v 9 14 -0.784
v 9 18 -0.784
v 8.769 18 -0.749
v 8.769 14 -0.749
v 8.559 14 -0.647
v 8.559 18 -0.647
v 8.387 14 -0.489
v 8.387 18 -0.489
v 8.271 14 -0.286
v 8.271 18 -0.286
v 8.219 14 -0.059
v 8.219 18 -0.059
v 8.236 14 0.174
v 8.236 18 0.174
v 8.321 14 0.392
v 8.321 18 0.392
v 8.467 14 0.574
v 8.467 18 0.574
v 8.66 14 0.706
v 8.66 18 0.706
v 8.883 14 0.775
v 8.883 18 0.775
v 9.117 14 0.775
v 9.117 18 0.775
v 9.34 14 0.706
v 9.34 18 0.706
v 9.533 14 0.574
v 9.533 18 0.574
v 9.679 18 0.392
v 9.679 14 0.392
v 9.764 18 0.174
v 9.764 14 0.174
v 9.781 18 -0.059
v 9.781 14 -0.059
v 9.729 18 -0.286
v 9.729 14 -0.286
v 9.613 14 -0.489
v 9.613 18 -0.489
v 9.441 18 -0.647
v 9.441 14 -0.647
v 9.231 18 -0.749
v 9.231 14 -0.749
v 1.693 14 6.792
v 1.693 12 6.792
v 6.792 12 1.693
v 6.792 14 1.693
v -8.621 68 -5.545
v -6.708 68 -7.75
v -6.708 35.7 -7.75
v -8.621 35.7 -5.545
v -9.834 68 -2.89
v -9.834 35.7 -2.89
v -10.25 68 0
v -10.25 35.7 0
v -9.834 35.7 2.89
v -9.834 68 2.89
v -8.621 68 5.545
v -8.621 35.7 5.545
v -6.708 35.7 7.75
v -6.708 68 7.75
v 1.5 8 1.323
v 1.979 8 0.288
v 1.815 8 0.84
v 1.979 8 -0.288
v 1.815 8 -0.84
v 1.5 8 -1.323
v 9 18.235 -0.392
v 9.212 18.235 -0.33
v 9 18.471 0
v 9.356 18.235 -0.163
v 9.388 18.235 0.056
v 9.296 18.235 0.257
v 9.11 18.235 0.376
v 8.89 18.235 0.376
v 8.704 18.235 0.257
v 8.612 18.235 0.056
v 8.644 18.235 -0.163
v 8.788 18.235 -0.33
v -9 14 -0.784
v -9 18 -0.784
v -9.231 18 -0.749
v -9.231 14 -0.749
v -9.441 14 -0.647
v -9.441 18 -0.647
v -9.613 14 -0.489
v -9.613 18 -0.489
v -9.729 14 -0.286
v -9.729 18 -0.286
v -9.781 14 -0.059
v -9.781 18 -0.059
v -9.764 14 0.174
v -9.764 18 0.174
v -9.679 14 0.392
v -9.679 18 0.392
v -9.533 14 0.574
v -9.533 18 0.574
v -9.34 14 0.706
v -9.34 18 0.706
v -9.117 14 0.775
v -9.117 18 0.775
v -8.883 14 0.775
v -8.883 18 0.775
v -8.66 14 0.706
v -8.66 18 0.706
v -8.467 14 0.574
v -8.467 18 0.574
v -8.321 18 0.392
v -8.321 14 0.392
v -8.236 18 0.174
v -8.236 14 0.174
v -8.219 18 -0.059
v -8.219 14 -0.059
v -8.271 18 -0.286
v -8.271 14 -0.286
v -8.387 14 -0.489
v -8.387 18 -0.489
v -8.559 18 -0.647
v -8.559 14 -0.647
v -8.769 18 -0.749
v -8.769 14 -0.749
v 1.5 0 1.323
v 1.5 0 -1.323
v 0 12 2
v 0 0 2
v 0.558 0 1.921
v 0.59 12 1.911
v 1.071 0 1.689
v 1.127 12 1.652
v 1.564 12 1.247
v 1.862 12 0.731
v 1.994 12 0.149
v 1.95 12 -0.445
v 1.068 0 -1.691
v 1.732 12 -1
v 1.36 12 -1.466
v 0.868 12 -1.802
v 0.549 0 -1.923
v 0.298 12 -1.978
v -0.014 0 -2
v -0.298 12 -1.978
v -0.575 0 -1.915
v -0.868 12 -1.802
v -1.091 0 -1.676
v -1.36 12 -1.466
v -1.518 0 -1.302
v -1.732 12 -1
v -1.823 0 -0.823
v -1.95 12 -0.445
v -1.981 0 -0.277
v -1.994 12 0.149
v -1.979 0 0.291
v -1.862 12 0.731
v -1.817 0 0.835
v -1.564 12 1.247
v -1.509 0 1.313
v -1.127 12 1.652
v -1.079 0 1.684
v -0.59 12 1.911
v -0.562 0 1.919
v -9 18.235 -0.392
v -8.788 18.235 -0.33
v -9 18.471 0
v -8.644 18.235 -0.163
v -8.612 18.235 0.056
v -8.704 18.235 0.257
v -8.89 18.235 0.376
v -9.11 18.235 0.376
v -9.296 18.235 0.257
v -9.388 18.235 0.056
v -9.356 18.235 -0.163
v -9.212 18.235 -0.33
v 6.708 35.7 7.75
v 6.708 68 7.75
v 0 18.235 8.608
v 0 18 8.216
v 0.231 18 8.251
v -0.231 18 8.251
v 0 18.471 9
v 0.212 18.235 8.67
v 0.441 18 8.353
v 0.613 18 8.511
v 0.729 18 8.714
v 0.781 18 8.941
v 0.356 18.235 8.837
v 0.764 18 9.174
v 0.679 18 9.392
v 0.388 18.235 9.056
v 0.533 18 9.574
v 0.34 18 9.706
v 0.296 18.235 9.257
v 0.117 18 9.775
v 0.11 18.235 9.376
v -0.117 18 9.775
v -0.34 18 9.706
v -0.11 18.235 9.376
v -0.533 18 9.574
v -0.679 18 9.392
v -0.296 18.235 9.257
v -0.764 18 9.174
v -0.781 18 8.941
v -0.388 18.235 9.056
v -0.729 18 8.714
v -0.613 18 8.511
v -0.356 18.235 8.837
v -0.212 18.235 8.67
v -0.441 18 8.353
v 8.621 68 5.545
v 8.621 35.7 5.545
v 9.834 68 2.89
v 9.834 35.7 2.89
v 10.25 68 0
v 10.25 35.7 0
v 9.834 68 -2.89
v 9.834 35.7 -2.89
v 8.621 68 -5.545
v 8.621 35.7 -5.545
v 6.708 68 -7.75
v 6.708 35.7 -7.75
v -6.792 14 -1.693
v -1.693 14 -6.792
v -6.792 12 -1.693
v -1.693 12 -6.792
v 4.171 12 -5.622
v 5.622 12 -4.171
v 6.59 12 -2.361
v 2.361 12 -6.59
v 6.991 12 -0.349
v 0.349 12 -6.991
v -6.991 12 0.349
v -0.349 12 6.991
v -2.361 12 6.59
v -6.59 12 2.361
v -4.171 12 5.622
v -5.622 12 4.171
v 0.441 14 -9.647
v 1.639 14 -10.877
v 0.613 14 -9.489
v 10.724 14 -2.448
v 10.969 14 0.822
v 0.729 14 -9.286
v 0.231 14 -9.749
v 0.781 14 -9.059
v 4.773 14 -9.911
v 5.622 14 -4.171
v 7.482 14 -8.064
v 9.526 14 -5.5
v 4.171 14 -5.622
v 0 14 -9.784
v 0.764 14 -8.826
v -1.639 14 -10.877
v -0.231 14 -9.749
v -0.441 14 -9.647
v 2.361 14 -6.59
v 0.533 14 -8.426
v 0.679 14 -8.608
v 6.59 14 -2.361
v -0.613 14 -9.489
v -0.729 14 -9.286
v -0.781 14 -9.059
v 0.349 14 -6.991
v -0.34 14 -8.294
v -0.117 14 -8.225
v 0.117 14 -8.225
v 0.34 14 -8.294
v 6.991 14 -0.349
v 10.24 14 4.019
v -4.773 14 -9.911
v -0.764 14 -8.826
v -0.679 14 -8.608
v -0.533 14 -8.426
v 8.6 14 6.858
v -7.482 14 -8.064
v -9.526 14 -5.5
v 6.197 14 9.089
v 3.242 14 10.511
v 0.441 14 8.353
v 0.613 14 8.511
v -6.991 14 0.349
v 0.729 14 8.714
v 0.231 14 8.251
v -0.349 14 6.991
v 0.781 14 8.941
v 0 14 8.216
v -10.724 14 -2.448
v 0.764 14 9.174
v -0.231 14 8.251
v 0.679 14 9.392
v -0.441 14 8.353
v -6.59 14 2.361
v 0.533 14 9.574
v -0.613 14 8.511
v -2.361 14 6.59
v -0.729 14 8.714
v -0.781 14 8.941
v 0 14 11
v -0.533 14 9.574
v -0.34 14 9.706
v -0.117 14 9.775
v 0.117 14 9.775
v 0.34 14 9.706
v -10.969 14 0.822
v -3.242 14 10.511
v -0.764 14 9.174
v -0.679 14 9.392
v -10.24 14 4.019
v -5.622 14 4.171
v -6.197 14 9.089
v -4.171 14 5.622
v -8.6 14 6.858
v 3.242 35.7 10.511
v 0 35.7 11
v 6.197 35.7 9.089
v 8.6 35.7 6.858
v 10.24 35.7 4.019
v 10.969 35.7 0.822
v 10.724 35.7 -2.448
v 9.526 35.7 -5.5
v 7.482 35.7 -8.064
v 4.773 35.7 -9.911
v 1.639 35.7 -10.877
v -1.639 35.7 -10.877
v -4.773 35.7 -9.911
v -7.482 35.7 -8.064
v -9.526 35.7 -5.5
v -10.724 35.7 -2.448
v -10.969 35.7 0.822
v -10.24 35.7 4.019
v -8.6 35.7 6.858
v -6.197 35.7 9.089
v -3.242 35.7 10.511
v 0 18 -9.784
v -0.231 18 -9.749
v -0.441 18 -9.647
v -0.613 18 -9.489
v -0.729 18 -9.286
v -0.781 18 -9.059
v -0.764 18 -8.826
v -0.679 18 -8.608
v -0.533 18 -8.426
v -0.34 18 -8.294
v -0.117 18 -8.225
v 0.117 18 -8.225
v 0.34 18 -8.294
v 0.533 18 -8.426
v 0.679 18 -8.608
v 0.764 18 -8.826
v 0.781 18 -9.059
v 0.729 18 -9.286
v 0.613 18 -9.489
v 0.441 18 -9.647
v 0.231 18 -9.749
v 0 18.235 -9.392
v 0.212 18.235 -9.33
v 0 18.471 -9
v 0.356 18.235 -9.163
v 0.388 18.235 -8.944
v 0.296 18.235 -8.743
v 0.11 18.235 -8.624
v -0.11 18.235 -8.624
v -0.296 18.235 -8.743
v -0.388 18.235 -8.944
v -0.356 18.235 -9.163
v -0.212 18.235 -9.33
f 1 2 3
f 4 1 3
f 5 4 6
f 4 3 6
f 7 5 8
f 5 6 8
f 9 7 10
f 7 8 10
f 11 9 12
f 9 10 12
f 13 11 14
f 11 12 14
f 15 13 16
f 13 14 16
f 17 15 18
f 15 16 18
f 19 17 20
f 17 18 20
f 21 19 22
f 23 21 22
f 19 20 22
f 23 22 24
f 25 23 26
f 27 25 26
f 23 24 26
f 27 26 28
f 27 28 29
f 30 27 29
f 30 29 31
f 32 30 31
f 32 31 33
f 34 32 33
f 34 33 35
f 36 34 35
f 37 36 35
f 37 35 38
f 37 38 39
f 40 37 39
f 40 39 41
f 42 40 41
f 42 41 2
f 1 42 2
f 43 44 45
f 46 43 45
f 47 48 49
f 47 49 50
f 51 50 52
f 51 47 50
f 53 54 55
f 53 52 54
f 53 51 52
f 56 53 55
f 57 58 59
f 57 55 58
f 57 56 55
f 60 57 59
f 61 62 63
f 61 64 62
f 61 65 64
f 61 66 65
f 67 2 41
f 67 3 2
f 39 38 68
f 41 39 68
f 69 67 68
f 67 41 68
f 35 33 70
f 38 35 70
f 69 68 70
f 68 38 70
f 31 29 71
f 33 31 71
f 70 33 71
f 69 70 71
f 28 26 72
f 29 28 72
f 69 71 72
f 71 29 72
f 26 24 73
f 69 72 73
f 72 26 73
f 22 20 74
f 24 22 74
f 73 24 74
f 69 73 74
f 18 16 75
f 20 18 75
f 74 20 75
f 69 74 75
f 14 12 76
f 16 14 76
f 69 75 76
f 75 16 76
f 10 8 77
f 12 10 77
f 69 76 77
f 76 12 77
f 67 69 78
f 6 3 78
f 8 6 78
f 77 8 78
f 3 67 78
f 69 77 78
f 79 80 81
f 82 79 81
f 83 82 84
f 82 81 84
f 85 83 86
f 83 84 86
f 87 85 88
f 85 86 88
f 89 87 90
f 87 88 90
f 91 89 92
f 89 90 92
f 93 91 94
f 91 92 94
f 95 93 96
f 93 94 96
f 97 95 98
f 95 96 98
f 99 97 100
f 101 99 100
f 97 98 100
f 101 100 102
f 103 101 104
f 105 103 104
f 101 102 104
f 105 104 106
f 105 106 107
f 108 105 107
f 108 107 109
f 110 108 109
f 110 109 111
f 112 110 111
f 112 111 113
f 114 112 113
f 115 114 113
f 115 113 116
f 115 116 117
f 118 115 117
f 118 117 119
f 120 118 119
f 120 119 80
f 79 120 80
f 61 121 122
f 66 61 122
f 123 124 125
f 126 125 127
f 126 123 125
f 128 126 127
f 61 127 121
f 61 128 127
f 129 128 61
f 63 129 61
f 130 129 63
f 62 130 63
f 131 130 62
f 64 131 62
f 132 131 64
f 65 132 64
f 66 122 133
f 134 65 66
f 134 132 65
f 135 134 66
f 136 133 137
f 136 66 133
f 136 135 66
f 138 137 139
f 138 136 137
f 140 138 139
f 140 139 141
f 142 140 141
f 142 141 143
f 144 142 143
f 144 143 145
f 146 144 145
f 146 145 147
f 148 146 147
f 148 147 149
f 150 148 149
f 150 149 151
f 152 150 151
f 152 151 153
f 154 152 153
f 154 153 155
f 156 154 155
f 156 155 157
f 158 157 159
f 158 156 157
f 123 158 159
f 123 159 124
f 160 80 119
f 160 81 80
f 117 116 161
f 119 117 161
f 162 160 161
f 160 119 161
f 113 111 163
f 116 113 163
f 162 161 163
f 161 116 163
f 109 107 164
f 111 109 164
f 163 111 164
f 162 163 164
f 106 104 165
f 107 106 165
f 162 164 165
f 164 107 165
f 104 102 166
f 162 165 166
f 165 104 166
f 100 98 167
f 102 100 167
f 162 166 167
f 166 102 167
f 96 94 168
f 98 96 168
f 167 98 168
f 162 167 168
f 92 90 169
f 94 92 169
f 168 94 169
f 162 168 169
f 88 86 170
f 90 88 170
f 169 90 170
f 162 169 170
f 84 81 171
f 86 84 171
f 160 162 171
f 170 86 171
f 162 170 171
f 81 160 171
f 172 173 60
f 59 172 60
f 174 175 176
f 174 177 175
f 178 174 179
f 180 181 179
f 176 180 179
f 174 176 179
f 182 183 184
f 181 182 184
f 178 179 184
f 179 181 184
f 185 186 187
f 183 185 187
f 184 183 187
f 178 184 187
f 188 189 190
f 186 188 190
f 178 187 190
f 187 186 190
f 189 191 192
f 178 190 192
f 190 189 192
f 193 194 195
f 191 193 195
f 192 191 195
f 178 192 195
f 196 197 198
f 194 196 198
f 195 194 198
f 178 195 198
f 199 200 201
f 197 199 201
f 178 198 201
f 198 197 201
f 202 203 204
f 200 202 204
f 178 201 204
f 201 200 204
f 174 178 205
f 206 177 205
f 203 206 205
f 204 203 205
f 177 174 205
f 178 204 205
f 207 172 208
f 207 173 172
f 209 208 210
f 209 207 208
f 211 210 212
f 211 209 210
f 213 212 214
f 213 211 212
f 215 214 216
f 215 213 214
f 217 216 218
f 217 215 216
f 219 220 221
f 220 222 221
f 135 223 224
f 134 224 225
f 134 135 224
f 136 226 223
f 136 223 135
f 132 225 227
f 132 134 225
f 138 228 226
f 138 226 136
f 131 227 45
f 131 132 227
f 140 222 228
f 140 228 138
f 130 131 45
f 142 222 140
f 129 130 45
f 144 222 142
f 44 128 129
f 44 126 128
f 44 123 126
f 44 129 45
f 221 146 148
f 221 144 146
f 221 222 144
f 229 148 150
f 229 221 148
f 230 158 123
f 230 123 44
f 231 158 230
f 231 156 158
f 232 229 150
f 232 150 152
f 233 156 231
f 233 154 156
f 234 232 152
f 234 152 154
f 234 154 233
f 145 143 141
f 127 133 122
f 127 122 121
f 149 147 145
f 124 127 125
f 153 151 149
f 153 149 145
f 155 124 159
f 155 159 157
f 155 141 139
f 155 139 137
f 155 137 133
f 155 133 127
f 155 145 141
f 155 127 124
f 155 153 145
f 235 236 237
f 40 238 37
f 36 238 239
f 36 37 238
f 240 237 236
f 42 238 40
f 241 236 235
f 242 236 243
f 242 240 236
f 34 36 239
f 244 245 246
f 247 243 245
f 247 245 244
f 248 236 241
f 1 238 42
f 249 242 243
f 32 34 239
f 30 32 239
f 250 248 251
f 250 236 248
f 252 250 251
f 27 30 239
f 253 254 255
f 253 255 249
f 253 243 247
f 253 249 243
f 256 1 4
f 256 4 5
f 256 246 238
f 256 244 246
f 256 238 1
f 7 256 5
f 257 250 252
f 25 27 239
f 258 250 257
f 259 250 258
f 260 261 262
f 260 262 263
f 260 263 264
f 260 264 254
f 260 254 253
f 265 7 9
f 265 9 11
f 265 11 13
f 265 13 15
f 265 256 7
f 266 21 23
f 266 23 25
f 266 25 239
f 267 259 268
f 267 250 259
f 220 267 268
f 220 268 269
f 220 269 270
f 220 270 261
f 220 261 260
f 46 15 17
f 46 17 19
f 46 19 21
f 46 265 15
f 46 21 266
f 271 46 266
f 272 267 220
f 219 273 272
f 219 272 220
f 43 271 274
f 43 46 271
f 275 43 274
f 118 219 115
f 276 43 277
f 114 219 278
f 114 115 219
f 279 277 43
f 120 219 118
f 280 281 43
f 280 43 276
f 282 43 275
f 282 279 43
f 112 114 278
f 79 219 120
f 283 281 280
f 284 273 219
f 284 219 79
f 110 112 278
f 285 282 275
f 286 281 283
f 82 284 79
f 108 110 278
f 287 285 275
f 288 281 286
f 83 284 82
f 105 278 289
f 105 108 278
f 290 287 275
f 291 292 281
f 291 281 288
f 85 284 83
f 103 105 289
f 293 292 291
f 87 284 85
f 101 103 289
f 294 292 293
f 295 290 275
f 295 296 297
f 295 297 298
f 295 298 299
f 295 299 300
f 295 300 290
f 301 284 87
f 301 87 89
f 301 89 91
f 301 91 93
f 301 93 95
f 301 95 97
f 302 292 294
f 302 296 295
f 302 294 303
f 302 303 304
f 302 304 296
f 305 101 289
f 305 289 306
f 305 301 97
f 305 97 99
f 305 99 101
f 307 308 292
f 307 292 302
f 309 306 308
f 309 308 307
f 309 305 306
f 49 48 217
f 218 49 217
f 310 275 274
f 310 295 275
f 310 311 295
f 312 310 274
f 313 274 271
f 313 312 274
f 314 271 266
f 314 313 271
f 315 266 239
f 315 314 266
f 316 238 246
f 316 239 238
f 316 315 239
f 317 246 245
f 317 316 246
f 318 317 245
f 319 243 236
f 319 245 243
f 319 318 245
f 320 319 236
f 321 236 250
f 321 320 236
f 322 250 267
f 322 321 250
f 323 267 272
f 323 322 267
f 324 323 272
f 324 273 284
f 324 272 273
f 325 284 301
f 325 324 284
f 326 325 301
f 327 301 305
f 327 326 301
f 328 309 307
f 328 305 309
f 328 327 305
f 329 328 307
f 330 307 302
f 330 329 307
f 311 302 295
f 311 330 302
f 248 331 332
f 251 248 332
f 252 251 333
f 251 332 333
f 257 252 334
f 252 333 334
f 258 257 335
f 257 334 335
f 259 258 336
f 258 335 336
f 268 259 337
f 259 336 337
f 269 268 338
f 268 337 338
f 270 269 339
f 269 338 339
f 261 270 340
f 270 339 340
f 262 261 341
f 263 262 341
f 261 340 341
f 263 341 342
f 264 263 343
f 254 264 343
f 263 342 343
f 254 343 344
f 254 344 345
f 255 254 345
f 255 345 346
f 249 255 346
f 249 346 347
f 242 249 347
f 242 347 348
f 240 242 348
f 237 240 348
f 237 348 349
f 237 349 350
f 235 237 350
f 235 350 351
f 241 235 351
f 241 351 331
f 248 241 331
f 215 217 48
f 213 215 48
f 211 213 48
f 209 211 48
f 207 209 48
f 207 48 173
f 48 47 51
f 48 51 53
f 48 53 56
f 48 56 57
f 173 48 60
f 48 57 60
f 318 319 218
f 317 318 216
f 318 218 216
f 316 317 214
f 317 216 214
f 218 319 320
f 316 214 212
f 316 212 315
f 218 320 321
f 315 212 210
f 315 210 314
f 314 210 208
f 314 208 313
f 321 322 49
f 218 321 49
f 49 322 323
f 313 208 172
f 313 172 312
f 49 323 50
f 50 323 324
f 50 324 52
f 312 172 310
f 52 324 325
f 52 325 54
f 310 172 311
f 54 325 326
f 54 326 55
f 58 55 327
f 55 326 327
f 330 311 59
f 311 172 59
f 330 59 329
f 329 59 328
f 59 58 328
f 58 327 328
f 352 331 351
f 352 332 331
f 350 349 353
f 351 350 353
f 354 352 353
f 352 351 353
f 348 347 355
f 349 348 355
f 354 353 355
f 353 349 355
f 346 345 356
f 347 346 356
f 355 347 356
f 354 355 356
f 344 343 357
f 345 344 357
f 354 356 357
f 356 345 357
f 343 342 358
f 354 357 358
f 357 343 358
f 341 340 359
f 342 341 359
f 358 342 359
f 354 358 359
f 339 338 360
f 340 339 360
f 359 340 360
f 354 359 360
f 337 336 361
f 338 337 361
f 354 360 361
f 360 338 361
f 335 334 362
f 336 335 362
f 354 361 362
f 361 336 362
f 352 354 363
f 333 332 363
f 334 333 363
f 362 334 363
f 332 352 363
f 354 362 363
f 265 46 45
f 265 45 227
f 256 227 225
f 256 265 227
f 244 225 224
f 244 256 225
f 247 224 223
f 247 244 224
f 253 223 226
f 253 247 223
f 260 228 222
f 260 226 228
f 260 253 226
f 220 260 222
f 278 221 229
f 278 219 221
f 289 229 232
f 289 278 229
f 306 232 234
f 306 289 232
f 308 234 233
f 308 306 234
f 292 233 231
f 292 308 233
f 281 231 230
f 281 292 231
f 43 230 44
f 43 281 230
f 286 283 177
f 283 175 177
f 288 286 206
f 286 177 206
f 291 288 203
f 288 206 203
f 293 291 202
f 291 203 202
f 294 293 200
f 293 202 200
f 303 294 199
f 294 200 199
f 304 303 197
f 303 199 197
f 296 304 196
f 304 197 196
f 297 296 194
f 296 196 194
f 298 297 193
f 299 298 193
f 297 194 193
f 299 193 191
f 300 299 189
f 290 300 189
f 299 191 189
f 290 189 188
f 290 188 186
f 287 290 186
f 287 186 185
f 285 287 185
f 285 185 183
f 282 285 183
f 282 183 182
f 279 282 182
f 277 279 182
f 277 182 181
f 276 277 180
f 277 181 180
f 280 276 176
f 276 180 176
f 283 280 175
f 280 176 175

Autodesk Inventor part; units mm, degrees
ref_plane "YZ Plane" through (0, 0, 0) normal (1, 0, 0) x (0, 1, 0)
ref_plane "XZ Plane" through (0, 0, 0) normal (0, 1, 0) x (-1, 0, 0)
ref_plane "XY Plane" through (0, 0, 0) normal (0, 0, 1) x (1, 0, 0)
sketch "Sketch1" plane through (0, 0, 0) normal (1, 0, 0) x (0, 1, 0)
  line L0 (0, 0) -> (-9.28, 0)
  line L1 (0, 0) -> (0, 2)
  line L2 (0, 2) -> (12, 2)
  line L3 (12, 2) -> (12, 7)
  line L4 (12, 7) -> (14, 7)
  line L5 (14, 7) -> (14, 11)
  line L6 (14, 11) -> (35.7, 11)
  line L7 (35.7, 11) -> (35.7, 10.25)
  line L8 (35.7, 10.25) -> (68, 10.25)
  line L9 (68, 10.25) -> (68, 0)
  line L10 (68, 0) -> (0, 0)
  dimension "d0" = 4
  dimension "d2" = 12
  dimension "d3" = 2
  dimension "d5" = 22
  dimension "d6" = 20.5
  dimension "d7" = 32.3
  dimension "d8" = 21.7
  dimension "d32" = 14
revolve "Revolution1" add sketch "Sketch1" angle 360 about axis through (0, 0, 0) along (0, -1, 0)
sketch "Sketch2" plane through (0, 14, 0) normal (0, -1, 0) x (1, 0, 0)
  circle A0 centre (0, 0) radius 11 projected
  point P0 (0, 9)
  point P1 (-9, 0)
  point P2 (0, -9)
  point P3 (9, 0)
  dimension "d12" = 360
  dimension "d15" = 18
hole "Hole1" at (0, 14, 9) at (-9, 14, 0) at (0, 14, -9) at (9, 14, 0) direction (0, 1, 0) diameter 1.567 depth 4 tip angle 118 thread size "M2x0.4" class "6H" standard "ANSI Metric M Profile"
sketch "Sketch3" plane through (0, 12, 0) normal (0, -1, 0) x (1, 0, 0)
  circle A0 centre (0, 0) radius 7 projected
  circle A1 centre (0, 0) radius 2 projected
  line L0 (1.6931, 6.7922) -> (6.7922, 1.6931)
  line L1 (-1.6931, -6.7922) -> (-6.7922, -1.6931)
  line L2 (0, 0) -> (-24.8191, 0) construction
  dimension "d23" = 135
  dimension "d24" = 12
extrude "Extrusion1" cut sketch "Sketch3" against normal up to surface (2 mm away) contours L0 A0 | A0 L1
sketch "Sketch4" plane through (0, 0, 0) normal (0, -1, 0) x (1, 0, 0)
  circle A0 centre (0, 0) radius 2 projected
  line L0 (1.5, 1.3229) -> (1.5, -1.3229)
  dimension "d28" = 1.5
extrude "Extrusion2" cut sketch "Sketch4" against normal blind 8 contours A0 L0 picked at (1.5908, -0.3089)
sketch "Sketch5" plane through (0, 68, 0) normal (0, 1, 0) x (1, 0, 0)
  circle A0 centre (0, 0) radius 10.25 projected
  line L0 (-6.7082, 7.75) -> (6.7082, 7.75)
  line L1 (6.7082, -7.75) -> (-6.7082, -7.75)
  dimension "d33" = 15.5
extrude "Extrusion3" cut sketch "Sketch5" against normal up to surface (32.3 mm away) contours L0 A0 | A0 L1
properties part number "Motor"
